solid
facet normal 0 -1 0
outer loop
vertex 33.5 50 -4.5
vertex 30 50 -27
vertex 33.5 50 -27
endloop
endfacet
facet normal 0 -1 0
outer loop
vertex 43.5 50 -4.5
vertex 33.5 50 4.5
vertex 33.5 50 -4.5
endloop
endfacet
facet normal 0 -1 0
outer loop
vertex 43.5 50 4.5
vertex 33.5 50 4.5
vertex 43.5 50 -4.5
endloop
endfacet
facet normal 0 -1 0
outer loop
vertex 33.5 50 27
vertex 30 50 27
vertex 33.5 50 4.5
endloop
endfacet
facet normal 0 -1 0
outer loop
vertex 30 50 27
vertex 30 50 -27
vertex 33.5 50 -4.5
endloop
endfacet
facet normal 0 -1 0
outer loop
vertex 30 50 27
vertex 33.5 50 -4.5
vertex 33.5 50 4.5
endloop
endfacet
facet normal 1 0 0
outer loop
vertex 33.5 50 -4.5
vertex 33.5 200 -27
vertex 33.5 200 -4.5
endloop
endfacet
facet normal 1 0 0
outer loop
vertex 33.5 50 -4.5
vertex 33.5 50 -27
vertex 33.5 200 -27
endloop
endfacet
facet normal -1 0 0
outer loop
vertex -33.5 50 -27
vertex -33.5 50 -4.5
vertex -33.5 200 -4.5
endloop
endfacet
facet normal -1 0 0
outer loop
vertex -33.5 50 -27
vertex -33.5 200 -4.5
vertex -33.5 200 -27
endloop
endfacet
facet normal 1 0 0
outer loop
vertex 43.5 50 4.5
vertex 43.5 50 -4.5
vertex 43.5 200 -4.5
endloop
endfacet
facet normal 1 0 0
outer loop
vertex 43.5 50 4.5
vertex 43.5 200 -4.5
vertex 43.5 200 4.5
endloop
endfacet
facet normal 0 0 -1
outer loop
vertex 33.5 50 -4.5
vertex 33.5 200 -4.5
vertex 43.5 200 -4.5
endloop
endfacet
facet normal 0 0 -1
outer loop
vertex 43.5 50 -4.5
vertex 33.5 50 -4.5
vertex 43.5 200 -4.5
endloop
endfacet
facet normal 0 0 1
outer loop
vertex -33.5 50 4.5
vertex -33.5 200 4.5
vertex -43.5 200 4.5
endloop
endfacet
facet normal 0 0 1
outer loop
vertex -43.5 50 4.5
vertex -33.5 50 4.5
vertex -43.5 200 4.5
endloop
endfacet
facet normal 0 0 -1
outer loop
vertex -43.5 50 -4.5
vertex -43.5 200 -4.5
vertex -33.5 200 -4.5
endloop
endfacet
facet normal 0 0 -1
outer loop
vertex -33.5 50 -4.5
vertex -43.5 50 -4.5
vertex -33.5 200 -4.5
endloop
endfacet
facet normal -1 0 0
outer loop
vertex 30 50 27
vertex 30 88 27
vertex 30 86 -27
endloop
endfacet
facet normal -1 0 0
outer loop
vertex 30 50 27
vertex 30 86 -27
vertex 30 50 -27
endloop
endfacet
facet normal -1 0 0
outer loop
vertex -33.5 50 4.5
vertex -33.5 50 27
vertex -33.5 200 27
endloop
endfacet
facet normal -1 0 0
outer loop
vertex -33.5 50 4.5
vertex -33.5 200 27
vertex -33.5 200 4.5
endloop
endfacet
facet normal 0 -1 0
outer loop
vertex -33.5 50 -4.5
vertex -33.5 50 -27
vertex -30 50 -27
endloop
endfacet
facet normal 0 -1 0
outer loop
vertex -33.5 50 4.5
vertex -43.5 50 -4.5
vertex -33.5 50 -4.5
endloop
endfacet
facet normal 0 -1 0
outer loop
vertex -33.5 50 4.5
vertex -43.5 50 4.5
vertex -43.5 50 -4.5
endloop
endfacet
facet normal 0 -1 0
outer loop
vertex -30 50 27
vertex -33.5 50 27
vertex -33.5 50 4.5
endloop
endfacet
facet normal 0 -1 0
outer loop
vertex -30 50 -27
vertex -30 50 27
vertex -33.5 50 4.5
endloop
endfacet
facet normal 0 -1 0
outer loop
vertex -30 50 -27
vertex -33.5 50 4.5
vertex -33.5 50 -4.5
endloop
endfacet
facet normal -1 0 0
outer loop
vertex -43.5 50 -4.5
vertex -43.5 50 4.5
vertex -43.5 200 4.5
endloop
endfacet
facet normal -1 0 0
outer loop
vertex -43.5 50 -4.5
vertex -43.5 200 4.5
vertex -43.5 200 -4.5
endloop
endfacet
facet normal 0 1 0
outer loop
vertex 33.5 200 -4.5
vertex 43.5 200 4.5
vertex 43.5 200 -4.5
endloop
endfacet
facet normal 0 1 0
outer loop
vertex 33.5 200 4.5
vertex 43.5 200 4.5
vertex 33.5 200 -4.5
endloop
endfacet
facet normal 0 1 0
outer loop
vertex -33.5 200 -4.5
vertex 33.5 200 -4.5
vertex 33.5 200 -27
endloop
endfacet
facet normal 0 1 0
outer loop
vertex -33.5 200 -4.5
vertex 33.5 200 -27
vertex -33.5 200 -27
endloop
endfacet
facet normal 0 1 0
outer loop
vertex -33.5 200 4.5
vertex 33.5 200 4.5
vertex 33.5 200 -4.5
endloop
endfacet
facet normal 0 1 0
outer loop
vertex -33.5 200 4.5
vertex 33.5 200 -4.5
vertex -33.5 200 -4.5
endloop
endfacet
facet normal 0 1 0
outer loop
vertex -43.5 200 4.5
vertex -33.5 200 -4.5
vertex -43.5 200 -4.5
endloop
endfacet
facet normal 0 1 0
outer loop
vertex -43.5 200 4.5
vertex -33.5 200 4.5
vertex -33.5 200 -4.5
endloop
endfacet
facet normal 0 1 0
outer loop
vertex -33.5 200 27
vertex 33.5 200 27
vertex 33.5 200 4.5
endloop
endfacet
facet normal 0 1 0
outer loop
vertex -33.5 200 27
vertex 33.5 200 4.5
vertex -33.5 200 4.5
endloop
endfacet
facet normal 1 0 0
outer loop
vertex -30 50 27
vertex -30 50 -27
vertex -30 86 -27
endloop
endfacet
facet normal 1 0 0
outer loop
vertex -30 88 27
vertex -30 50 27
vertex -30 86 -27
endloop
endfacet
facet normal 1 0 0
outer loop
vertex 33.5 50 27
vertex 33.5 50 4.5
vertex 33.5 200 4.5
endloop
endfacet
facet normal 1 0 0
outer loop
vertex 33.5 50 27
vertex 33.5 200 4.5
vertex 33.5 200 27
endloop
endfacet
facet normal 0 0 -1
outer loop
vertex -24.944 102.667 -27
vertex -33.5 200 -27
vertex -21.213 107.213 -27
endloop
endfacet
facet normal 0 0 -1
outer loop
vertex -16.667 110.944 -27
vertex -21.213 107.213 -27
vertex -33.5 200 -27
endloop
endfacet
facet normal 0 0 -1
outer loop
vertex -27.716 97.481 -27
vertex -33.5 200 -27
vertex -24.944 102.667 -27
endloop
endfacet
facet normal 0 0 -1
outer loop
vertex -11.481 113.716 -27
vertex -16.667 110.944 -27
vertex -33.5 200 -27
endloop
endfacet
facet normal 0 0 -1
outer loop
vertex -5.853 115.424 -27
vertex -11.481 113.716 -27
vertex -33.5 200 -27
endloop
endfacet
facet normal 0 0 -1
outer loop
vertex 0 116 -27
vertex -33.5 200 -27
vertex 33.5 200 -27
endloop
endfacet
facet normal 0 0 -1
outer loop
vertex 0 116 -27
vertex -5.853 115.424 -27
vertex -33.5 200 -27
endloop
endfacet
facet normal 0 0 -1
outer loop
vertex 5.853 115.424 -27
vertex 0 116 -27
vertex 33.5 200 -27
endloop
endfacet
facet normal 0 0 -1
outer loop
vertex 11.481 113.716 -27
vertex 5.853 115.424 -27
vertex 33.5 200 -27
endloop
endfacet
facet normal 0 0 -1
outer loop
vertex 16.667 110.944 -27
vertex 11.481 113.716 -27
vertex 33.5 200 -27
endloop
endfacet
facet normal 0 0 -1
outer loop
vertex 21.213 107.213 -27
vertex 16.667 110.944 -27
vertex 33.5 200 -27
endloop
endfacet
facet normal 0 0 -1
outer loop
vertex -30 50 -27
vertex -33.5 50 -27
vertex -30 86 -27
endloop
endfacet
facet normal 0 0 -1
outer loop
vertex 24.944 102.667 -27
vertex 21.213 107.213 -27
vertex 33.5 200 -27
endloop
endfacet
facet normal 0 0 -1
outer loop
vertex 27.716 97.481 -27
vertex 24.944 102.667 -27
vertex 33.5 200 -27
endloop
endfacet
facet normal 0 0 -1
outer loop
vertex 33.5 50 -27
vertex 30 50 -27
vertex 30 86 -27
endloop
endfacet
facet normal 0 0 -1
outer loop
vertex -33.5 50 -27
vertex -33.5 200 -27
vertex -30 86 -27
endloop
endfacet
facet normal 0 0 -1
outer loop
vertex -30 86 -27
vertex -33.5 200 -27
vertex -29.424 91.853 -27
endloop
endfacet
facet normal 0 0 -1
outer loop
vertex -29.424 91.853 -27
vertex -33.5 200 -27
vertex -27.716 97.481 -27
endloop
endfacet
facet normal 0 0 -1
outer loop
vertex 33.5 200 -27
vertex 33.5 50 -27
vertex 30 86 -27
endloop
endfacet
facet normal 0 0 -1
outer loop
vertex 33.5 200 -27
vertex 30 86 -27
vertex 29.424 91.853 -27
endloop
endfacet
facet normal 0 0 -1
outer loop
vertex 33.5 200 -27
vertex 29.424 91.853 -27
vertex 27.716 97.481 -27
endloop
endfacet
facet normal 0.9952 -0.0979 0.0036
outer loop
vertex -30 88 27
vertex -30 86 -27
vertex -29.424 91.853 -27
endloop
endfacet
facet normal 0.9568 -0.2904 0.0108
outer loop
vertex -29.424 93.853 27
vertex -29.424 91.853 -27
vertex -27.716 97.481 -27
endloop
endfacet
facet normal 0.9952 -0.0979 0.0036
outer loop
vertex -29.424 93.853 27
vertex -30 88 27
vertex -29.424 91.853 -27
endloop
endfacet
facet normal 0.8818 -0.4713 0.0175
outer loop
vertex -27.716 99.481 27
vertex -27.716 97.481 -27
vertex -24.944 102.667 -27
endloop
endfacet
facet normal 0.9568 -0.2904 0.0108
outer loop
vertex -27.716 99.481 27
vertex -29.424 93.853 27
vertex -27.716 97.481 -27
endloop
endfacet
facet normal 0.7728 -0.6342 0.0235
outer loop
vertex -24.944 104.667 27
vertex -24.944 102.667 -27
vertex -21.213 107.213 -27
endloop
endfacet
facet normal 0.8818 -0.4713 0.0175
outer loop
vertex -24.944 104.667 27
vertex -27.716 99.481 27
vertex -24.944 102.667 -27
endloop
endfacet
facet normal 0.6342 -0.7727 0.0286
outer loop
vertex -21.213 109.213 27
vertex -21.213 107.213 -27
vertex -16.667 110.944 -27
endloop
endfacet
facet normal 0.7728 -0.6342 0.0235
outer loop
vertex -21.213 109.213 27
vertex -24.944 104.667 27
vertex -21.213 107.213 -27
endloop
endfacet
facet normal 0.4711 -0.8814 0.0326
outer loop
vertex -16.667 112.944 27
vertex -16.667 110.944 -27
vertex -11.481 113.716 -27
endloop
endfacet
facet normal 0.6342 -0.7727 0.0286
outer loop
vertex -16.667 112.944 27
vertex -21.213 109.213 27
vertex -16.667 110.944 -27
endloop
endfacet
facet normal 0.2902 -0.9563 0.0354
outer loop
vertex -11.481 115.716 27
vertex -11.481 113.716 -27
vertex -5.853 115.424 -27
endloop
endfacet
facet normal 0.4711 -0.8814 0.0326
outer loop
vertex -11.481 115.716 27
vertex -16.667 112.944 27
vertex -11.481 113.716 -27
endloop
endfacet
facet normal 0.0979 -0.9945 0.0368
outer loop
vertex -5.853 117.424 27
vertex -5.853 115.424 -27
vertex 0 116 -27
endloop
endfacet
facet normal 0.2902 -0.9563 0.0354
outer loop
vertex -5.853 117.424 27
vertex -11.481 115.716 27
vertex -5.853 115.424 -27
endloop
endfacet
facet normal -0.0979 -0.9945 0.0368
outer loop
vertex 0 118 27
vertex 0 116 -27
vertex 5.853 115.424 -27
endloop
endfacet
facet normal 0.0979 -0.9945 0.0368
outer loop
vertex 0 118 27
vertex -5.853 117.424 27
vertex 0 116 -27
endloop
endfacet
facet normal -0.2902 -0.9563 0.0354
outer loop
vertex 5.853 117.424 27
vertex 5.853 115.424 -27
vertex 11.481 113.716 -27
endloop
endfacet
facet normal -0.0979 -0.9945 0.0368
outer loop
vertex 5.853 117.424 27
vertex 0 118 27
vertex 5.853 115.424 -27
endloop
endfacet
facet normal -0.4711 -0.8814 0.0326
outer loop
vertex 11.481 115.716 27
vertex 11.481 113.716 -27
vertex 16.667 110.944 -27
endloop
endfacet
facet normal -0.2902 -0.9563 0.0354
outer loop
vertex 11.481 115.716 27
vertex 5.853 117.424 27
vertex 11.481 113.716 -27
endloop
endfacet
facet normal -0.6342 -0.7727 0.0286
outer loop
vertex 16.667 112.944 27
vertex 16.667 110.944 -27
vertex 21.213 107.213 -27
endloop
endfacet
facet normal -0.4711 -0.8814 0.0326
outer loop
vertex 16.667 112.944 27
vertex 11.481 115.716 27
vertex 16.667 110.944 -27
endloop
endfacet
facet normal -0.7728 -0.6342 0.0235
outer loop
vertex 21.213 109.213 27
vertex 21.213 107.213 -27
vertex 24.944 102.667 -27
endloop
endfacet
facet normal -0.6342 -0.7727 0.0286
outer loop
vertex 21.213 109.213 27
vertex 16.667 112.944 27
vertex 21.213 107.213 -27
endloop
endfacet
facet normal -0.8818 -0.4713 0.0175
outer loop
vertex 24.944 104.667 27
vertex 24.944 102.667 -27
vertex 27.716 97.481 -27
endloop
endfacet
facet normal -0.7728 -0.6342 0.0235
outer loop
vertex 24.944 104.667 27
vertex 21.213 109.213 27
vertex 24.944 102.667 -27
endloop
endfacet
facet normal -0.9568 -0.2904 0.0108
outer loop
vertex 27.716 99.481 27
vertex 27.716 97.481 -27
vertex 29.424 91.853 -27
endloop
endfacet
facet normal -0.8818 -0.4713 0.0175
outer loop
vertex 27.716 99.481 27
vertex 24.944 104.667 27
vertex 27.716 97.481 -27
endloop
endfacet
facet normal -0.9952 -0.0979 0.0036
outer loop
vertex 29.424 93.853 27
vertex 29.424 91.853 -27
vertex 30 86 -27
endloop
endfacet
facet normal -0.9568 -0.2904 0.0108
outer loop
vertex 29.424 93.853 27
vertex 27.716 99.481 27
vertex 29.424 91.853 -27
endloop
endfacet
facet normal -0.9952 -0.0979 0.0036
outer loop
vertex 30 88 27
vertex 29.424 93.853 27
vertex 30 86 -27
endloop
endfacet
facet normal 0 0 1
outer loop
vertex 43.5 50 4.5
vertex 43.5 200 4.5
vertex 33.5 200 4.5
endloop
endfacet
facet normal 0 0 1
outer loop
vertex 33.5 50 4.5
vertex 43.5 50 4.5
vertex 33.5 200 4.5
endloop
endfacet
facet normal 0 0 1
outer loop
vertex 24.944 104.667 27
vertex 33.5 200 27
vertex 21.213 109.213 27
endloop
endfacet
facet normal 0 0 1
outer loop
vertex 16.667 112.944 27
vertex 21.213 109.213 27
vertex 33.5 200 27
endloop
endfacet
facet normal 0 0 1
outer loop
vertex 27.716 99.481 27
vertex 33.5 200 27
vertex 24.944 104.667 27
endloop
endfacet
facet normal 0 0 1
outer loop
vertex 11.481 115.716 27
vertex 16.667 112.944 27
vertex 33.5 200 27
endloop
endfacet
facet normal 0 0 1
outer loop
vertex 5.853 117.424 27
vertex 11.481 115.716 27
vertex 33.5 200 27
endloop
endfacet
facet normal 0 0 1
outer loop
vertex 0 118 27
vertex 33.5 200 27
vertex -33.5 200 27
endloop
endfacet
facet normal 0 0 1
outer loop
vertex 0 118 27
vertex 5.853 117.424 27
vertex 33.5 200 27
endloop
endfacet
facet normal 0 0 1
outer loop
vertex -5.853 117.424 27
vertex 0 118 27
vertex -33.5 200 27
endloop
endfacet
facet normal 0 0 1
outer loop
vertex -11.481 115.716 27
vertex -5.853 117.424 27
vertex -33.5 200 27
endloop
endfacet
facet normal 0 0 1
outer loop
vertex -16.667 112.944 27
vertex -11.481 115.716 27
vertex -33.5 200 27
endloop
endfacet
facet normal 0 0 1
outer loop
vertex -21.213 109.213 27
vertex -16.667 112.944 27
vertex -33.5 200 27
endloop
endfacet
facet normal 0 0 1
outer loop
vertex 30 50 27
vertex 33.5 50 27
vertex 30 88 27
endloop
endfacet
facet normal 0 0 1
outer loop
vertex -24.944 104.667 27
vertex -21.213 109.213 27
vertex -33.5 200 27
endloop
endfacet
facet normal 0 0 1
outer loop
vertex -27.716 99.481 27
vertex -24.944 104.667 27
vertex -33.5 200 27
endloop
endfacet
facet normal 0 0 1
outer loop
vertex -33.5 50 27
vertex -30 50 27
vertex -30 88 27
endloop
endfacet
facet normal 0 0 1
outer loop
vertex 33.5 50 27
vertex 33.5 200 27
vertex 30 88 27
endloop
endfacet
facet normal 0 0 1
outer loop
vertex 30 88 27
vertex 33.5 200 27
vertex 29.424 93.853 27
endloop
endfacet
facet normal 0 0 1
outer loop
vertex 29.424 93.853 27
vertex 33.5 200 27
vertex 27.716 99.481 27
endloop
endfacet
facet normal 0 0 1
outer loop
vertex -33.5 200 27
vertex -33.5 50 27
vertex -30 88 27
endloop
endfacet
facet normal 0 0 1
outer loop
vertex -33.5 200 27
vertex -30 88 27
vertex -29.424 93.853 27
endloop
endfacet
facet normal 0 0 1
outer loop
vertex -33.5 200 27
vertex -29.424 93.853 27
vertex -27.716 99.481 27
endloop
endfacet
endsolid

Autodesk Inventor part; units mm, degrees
ref_plane "YZ Plane" through (0, 0, 0) normal (1, 0, 0) x (0, 1, 0)
ref_plane "XZ Plane" through (0, 0, 0) normal (0, 1, 0) x (-1, 0, 0)
ref_plane "XY Plane" through (0, 0, 0) normal (0, 0, 1) x (1, 0, 0)
sketch "草圖1" plane through (0, 0, 0) normal (0, 1, 0) x (-1, 0, 0)
  line L0 (-33.5, 27) -> (33.5, 27)
  line L1 (33.5, 27) -> (33.5, -27)
  line L2 (33.5, -27) -> (-33.5, -27)
  line L3 (-33.5, -27) -> (-33.5, 27)
  line L4 (-33.5, 27) -> (33.5, -27) construction
  line L5 (33.5, 27) -> (-33.5, -27) construction
  line L6 (43.5, -4.5) -> (33.5, -4.5)
  line L7 (33.5, -4.5) -> (33.5, 4.5)
  line L8 (33.5, 4.5) -> (43.5, 4.5)
  line L9 (43.5, 4.5) -> (43.5, -4.5)
  line L10 (-33.5, -4.5) -> (-43.5, -4.5)
  line L11 (-43.5, -4.5) -> (-43.5, 4.5)
  line L12 (-43.5, 4.5) -> (-33.5, 4.5)
  line L13 (-33.5, 4.5) -> (-33.5, -4.5)
  point P0 (0, 0)
  point P1 (33.5, 0)
  point P2 (-33.5, 0)
  point P3 (-33.5, 4.5)
  point P4 (-33.5, -4.5)
  dimension "d0" = 67
  dimension "d1" = 54
  dimension "d2" = 9
  dimension "d3" = 10
extrude "擠出1" add sketch "草圖1" along normal blind 200
sketch "草圖2" plane through (-33.5, 0, 27) normal (0, 0, 1) x (1, 0, 0)
  circle A0 centre (33.5, 78) radius 30
  line L0 (0, 0) -> (67, 0) projected
  line L1 (3.5, 78) -> (63.5, 78)
  line L2 (63.5, 78) -> (63.5, -10.8713)
  line L3 (63.5, -10.8713) -> (3.5, -10.8713)
  line L4 (3.5, -10.8713) -> (3.5, 78)
  point P0 (33.5, 0)
  point P1 (33.5, 0)
  point P2 (63.5, 78)
  dimension "d6" = 78
  dimension "d7" = 60
extrude "擠出2" cut sketch "草圖2" against normal through all
sketch "草圖3" plane through (-33.5, 200, 27) normal (0, 0, 1) x (1, 0, 0)
  line L0 (-51.5496, -150) -> (118.5496, -150)
  line L1 (118.5496, -150) -> (118.5496, -200)
  line L2 (118.5496, -200) -> (-51.5496, -200)
  line L3 (-51.5496, -200) -> (-51.5496, -150)
  point P0 (33.5, -200)
  point P1 (33.5, -200)
  dimension "d10" = 50
extrude "擠出3" cut sketch "草圖3" against normal through all
sketch "草圖4" plane through (33.5, 200, -27) normal (0, 0, -1) x (-1, 0, 0)
  arc A0 (63.5, -122) -> (3.5, -122) centre (33.5, -122) ccw construction
  circle A1 centre (33.5, -114) radius 30
  line L0 (63.5, -150) -> (3.5, -150)
  line L1 (3.5, -150) -> (3.5, -114)
  line L2 (3.5, -114) -> (63.5, -114)
  line L3 (63.5, -114) -> (63.5, -150)
  point P0 (33.5, -200)
  point P1 (63.5, -150)
  dimension "d13" = 8
  dimension "d14" = 60
sketch "草圖5" plane through (-33.5, 200, 27) normal (0, 0, 1) x (1, 0, 0)
  arc A0 (63.5, -122) -> (3.5, -122) centre (33.5, -122) ccw construction
  circle A1 centre (33.5, -112) radius 30
  line L0 (63.5, -150) -> (3.5, -150)
  line L1 (3.5, -150) -> (3.5, -112)
  line L2 (3.5, -112) -> (63.5, -112)
  line L3 (63.5, -112) -> (63.5, -150)
  point P0 (33.5, -200)
  point P1 (63.5, -150)
  dimension "d15" = 10
  dimension "d16" = 60
loft "斷面混成1" cut profiles "草圖4", "草圖5"
properties part number "Slider-3"
